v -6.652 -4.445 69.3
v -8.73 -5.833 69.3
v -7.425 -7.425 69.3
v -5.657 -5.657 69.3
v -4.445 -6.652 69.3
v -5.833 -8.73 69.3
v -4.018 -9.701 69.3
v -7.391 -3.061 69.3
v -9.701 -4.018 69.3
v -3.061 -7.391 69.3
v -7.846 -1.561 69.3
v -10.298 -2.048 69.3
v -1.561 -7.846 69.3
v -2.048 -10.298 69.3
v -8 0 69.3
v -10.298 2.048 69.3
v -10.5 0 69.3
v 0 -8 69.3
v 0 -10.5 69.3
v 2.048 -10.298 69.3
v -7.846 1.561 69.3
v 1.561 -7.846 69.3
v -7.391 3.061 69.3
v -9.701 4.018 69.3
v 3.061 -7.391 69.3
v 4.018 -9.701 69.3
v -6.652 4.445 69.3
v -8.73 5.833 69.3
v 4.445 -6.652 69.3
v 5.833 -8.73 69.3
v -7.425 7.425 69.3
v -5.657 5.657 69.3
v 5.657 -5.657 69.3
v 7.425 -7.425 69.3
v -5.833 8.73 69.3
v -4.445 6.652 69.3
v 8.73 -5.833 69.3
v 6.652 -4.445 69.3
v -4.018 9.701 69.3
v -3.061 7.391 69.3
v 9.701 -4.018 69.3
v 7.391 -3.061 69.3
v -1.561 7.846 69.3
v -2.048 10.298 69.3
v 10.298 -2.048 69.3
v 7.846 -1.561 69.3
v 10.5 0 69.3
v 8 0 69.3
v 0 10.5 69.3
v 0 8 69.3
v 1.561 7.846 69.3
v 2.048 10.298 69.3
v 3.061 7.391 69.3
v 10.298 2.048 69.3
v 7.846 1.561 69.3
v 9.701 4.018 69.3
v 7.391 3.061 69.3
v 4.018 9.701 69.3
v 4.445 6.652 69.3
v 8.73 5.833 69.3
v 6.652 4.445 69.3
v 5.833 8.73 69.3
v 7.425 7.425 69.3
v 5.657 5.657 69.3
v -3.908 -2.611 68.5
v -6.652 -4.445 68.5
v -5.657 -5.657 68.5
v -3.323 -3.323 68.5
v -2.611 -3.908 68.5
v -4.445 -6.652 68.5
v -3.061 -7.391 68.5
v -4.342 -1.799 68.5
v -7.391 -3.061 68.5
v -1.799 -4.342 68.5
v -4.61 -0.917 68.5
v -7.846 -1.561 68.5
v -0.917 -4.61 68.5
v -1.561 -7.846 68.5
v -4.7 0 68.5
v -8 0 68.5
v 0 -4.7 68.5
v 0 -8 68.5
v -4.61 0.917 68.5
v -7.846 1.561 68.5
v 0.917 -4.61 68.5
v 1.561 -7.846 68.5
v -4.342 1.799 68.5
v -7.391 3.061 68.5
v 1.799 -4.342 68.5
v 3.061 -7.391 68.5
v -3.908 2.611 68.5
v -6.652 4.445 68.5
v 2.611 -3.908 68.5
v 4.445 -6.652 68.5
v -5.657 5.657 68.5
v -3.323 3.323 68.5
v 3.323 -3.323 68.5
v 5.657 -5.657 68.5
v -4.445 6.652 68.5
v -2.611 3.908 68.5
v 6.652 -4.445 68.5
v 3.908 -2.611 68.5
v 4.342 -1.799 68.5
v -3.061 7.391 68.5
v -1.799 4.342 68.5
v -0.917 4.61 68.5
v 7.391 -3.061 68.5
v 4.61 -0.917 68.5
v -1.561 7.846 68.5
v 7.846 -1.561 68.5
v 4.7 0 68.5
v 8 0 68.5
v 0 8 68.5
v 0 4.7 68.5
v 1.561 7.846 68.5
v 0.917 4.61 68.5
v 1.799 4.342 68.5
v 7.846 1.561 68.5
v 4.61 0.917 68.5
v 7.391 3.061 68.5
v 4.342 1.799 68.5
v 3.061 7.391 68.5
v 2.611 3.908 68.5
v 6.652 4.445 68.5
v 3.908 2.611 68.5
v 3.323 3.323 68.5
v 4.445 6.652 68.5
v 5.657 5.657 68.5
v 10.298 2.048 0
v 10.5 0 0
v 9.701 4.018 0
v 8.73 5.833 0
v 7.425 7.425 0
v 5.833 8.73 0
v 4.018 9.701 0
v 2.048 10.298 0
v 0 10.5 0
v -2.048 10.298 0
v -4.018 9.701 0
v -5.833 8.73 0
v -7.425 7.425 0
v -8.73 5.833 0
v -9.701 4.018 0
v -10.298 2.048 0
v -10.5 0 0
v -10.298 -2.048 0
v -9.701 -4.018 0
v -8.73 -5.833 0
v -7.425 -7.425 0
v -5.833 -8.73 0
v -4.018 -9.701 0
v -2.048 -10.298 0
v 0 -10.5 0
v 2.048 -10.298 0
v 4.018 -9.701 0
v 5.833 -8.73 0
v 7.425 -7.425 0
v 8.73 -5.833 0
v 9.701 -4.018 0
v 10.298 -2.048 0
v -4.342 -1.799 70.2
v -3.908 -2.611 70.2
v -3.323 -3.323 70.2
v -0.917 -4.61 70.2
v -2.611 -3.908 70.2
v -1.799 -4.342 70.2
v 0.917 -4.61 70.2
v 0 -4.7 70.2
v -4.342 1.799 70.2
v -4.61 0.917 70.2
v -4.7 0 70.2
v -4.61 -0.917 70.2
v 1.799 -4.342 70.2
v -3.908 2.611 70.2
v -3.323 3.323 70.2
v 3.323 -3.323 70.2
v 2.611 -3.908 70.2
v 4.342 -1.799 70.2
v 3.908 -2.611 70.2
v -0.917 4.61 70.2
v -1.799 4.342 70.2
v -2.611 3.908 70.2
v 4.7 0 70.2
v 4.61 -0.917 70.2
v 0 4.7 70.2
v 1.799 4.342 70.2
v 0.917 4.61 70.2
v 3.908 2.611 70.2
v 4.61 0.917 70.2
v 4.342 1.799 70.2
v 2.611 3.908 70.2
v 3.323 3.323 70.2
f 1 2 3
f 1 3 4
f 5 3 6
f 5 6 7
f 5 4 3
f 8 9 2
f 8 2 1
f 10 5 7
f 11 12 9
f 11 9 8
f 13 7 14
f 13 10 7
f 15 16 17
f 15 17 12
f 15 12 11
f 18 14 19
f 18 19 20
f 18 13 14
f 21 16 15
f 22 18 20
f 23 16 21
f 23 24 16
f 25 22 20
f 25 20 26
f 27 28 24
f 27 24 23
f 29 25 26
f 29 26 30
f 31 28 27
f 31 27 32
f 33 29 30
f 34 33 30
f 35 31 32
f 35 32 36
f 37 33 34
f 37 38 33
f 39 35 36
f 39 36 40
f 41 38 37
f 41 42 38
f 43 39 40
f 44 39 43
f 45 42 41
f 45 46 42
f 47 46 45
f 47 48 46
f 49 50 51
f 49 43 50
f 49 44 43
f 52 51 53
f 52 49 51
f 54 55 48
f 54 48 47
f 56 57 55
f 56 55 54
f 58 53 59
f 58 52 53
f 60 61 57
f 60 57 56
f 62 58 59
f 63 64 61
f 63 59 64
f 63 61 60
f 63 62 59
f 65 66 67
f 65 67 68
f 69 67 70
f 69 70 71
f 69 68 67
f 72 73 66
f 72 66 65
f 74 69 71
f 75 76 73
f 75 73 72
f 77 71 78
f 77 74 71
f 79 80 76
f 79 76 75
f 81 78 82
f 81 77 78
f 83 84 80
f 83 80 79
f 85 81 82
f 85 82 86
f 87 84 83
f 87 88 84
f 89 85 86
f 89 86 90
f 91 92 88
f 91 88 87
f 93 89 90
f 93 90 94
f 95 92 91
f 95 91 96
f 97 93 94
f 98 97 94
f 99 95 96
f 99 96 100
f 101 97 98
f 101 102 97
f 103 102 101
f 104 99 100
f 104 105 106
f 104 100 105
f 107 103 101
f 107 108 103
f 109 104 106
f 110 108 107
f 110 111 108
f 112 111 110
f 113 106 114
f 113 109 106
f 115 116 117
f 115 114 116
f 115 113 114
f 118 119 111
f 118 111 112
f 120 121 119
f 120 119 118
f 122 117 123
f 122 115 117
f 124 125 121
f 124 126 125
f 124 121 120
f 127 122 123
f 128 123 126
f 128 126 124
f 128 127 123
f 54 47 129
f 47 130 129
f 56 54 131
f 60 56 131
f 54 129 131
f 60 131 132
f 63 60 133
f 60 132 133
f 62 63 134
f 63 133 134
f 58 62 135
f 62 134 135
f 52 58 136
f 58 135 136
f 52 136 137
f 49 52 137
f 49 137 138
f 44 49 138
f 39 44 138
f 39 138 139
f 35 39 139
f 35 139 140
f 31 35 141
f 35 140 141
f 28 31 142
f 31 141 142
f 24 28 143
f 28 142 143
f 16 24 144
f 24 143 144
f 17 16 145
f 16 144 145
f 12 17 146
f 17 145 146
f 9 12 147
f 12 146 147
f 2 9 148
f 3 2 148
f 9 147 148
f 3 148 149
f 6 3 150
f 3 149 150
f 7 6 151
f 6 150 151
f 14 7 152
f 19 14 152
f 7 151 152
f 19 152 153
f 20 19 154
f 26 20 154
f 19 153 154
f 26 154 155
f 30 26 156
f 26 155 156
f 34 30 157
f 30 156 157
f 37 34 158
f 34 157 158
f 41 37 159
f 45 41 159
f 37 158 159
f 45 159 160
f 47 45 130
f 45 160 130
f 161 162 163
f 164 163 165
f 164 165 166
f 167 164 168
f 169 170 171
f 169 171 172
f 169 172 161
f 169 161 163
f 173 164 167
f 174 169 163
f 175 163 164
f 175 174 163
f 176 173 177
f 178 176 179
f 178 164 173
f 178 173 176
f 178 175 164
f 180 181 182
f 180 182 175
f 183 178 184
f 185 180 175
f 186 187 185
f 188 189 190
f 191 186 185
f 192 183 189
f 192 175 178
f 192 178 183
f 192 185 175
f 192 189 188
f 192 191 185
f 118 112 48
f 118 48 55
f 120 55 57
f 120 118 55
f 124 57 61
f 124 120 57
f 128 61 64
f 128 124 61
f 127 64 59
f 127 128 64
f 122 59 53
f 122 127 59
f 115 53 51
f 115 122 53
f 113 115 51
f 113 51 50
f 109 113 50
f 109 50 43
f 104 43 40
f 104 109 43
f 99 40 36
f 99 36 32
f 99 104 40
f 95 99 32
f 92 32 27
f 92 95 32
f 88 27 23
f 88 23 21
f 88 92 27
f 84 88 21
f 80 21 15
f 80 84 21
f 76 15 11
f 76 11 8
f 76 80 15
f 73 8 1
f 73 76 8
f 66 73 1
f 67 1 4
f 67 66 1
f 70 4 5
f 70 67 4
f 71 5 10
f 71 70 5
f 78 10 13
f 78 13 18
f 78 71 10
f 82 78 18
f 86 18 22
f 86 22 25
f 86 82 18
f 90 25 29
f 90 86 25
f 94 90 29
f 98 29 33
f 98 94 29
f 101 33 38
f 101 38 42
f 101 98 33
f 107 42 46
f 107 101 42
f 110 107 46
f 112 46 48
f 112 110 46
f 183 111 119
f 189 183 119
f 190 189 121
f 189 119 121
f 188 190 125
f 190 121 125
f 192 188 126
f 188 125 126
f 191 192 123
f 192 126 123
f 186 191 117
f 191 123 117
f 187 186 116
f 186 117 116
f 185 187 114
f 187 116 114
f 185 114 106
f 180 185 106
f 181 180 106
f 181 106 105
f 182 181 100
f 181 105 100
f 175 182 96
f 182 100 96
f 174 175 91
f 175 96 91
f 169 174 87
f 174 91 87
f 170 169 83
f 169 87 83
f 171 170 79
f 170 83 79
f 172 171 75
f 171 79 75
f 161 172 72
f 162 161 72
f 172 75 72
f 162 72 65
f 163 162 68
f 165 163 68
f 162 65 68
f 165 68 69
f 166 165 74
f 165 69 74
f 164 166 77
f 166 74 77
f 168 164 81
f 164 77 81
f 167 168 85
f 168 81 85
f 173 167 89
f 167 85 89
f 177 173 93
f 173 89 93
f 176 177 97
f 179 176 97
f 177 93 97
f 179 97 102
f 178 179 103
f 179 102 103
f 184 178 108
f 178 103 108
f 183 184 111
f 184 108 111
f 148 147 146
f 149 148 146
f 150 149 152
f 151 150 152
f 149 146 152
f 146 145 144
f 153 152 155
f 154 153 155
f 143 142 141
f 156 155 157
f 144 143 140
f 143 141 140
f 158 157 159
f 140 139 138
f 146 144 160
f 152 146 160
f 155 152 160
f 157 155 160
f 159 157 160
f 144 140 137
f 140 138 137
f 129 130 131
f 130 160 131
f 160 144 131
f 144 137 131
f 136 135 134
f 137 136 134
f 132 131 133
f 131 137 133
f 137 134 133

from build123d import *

# Parameters (mm, degrees)
SKETCH1_R           = 10.5
BOSS_EXTRUDE1_DEPTH = 68.50000016
SKETCH2_R           = 4.7
BOSS_EXTRUDE2_DEPTH = 1.7
SKETCH3_R           = 10.5
SKETCH3_R_2         = 8
BOSS_EXTRUDE3_DEPTH = 0.8


with BuildPart() as part:
    # Sketch1 → Boss-Extrude1 (new body)
    with BuildSketch(Plane.XY):
        Circle(SKETCH1_R)
    extrude(amount=BOSS_EXTRUDE1_DEPTH)

    # Sketch2 → Boss-Extrude2 (add)
    with BuildSketch(Plane.XY.offset(68.50000016)):
        Circle(SKETCH2_R)
    extrude(amount=BOSS_EXTRUDE2_DEPTH)

    # Sketch3 → Boss-Extrude3 (add)
    with BuildSketch(Plane.XY.offset(68.50000016)):
        Circle(SKETCH3_R)
        Circle(SKETCH3_R_2, mode=Mode.SUBTRACT)
    extrude(amount=BOSS_EXTRUDE3_DEPTH)


solid = part.part
